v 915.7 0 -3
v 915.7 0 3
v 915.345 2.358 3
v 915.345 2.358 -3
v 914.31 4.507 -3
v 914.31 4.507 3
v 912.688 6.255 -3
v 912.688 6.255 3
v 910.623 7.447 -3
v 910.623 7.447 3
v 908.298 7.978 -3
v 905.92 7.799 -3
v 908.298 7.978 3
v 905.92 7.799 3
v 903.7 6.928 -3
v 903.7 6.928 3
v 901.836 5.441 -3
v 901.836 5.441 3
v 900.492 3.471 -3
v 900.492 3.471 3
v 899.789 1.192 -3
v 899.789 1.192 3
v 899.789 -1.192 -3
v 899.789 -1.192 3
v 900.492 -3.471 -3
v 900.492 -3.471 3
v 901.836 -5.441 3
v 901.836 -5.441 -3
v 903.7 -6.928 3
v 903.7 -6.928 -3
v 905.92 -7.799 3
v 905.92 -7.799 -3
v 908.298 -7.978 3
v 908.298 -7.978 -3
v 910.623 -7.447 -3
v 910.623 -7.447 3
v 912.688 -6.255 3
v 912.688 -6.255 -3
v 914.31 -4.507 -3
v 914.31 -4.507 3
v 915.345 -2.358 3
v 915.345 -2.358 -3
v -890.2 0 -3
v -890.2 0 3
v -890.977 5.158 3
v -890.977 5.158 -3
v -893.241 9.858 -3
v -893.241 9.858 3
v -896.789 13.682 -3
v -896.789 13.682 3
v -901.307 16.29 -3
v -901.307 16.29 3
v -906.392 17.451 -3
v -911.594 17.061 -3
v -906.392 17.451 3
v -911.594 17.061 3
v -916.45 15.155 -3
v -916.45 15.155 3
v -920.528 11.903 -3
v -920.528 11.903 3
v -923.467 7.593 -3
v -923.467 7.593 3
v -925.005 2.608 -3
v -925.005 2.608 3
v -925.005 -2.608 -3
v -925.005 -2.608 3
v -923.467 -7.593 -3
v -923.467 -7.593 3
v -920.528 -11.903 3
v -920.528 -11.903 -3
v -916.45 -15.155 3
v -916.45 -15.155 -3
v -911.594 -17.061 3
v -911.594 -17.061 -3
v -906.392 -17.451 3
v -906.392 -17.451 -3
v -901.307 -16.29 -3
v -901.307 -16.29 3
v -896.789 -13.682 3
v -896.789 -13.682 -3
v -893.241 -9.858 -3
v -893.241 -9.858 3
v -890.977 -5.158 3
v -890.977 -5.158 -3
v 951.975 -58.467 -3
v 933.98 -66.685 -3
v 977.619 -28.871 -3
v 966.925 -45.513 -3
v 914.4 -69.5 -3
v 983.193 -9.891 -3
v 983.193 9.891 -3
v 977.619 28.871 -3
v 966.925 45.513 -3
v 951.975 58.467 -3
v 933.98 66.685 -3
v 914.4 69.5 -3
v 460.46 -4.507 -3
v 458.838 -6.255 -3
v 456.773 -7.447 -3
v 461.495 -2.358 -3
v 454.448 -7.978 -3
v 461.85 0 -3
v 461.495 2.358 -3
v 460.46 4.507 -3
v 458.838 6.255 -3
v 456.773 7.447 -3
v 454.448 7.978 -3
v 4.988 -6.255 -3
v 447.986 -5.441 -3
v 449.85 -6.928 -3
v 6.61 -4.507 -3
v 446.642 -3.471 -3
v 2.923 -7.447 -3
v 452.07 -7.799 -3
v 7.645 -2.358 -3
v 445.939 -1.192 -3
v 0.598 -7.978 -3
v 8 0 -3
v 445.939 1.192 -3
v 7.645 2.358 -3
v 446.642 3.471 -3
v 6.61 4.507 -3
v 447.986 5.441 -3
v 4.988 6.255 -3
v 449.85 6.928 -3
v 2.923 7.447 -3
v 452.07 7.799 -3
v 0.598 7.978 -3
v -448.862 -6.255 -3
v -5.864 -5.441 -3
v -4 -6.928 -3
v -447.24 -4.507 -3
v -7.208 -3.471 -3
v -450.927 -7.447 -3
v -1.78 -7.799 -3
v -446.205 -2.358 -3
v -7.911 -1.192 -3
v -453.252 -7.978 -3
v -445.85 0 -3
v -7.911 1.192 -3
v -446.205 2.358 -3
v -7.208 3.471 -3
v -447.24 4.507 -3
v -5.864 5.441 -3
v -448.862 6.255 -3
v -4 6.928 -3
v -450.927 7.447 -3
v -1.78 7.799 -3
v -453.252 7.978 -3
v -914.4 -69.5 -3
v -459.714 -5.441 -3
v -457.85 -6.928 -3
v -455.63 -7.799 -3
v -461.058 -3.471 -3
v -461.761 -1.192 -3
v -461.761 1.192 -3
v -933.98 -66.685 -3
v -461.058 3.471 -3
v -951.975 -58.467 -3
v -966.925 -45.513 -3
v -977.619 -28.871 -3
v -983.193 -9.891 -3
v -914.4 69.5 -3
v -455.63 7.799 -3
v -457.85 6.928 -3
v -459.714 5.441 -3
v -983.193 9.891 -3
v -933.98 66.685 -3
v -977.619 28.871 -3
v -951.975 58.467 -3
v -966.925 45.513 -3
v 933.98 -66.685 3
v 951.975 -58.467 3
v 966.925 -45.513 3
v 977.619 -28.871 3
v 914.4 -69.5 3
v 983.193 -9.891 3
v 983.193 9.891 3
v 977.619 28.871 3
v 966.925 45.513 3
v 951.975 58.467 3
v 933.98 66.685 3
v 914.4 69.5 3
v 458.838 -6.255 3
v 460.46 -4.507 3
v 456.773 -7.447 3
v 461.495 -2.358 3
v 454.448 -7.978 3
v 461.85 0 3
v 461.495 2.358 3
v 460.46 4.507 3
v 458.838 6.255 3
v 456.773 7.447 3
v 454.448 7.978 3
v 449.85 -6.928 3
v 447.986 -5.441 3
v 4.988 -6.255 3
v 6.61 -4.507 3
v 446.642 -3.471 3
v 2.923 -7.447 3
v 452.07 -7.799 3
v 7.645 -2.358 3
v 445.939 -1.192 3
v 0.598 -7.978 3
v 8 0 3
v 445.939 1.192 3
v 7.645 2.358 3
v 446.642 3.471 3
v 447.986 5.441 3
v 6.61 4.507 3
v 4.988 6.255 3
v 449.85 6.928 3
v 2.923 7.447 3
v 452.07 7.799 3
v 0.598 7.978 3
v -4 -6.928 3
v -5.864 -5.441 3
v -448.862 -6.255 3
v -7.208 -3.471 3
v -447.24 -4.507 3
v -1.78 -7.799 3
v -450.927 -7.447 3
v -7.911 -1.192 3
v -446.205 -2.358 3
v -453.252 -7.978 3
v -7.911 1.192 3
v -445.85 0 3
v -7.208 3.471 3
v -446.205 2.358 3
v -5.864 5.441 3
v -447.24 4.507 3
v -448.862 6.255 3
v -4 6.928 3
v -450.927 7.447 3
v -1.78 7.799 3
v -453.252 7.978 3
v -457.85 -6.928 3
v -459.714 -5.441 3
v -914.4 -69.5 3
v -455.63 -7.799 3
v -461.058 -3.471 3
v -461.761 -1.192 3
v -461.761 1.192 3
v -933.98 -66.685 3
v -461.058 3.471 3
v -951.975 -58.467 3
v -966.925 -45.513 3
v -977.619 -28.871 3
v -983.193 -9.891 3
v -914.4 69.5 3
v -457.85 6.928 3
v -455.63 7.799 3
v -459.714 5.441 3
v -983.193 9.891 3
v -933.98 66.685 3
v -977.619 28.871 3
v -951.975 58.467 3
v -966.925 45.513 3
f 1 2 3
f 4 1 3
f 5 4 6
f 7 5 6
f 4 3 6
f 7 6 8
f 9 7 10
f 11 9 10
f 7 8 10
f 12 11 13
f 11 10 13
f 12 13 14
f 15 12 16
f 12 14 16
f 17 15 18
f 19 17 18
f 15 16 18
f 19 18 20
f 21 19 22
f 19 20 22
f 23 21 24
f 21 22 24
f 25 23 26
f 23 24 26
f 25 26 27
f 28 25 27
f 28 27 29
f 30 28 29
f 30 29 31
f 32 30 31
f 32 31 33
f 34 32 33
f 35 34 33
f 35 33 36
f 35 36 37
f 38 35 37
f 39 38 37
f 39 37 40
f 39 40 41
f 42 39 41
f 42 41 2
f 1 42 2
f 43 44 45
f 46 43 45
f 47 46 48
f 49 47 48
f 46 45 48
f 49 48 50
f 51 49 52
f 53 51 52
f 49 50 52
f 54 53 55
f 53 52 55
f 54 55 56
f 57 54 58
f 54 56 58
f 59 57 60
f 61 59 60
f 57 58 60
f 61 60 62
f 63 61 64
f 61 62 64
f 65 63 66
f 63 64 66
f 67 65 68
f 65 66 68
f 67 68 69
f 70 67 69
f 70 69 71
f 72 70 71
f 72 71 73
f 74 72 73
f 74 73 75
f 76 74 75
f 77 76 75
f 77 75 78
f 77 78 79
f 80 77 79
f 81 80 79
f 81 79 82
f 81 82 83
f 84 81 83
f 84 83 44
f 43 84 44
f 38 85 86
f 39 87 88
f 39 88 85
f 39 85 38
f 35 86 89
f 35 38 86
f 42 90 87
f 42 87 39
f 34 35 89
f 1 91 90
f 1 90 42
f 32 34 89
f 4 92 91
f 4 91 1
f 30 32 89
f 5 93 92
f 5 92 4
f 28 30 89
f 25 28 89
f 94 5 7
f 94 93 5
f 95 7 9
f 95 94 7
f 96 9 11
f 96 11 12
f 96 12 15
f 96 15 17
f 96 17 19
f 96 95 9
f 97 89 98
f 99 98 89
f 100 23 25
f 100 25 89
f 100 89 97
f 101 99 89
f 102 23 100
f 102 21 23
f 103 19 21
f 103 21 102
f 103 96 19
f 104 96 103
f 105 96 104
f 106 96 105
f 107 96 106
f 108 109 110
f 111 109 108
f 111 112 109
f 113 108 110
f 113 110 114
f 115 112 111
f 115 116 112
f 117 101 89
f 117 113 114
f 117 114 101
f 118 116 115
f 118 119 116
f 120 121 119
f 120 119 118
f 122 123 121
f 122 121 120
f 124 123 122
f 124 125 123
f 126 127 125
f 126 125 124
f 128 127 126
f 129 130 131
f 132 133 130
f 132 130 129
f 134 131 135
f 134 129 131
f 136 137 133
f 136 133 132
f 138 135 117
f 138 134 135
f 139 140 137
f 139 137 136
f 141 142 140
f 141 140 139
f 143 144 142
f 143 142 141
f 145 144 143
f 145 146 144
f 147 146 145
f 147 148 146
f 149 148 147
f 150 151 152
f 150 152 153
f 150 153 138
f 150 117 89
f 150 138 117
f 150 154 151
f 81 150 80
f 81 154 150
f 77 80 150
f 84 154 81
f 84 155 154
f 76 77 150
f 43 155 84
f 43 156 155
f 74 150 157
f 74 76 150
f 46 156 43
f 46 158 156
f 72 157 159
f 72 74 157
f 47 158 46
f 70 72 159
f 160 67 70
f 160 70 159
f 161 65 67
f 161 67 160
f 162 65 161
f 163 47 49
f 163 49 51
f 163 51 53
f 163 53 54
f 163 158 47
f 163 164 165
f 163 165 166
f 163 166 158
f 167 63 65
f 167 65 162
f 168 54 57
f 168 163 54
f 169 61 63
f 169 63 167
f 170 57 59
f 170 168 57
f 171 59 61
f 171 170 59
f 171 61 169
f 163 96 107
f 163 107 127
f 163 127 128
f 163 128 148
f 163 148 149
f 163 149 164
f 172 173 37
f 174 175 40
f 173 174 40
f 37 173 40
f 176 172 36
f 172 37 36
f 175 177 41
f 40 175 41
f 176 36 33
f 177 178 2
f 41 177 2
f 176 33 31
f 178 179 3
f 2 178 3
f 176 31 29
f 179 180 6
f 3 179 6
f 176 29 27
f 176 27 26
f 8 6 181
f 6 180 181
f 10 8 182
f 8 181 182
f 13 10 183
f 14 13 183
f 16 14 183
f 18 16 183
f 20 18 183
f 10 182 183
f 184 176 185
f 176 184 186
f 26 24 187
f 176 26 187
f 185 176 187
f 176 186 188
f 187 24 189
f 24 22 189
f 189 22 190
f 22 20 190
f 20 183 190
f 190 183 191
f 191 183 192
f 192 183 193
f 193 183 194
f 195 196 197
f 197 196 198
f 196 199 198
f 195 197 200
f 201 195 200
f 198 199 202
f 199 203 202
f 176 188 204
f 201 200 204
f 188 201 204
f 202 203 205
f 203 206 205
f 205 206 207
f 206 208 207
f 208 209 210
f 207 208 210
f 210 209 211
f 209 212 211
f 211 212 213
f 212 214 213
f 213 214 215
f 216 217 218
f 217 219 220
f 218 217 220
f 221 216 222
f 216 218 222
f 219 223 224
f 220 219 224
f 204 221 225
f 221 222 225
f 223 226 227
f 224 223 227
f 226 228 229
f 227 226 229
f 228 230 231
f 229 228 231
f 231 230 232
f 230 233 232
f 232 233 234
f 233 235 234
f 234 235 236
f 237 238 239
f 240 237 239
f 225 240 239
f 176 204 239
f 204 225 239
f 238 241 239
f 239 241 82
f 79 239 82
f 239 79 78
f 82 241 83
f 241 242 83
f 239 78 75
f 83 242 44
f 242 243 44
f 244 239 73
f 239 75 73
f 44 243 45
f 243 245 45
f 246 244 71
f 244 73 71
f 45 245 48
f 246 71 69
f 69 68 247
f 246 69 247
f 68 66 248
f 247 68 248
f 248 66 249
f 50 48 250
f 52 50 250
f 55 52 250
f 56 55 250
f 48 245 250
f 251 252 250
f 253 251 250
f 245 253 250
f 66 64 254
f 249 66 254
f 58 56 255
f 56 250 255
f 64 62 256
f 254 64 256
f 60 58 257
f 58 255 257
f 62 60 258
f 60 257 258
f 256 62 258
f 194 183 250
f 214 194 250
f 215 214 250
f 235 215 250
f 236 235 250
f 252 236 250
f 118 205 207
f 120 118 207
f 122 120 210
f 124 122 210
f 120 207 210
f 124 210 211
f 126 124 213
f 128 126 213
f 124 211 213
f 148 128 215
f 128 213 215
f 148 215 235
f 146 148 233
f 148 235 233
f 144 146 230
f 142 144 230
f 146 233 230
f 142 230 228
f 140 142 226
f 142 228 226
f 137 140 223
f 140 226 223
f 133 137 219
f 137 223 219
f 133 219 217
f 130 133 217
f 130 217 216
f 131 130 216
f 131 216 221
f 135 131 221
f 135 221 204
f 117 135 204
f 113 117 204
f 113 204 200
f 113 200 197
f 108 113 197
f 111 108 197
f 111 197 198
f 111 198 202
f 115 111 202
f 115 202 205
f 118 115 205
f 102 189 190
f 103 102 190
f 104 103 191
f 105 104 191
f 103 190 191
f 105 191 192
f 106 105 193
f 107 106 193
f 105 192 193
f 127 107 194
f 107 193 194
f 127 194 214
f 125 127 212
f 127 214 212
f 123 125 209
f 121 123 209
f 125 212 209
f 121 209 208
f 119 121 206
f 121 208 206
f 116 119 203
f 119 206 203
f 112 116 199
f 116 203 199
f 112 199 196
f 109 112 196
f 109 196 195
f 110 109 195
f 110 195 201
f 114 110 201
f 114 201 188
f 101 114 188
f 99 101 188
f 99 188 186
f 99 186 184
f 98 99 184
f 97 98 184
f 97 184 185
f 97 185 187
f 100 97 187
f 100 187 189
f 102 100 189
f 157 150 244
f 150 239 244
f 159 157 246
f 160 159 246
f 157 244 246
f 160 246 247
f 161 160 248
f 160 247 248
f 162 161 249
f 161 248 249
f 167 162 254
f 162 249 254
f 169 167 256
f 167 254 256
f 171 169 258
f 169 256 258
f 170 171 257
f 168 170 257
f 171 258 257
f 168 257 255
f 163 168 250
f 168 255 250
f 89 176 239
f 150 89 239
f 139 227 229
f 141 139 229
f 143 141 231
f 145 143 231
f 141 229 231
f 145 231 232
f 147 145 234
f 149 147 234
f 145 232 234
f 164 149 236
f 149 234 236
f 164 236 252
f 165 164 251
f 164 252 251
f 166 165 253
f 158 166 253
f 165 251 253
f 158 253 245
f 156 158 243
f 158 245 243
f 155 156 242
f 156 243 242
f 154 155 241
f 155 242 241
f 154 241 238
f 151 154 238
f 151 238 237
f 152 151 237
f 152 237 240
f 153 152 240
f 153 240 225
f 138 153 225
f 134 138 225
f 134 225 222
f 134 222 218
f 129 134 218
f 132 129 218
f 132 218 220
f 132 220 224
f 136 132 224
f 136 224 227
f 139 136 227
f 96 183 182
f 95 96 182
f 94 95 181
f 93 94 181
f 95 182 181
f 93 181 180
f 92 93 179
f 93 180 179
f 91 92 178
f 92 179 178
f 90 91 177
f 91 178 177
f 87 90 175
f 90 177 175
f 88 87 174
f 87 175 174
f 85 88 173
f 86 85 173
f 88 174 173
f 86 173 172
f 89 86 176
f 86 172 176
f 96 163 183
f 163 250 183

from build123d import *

# Parameters (mm, degrees)
EXTRUDE_THIN1_DEPTH     = 3
BOSS_EXTRUDE1_DEPTH     = 3
SKETCH2_R               = 8
SKETCH2_R_2             = 17.5
CUT_EXTRUDE1_DEPTH      = 1
CUT_EXTRUDE1_DEPTH_BACK = 7


with BuildPart() as part:
    # Sketch1 → Extrude-Thin1 (new body, symmetric)
    with BuildSketch(Plane.XY):
        with BuildLine():
            Line((914.4, -69.5), (-914.4, -69.5))
            ThreePointArc((-914.4, -69.5), (-983.9, 0), (-914.4, 69.5))
            Line((-914.4, 69.5), (914.4, 69.5))
            ThreePointArc((914.4, 69.5), (983.9, 0), (914.4, -69.5))
        make_face()
        with BuildLine():
            Line((914.4, -63.5), (-914.4, -63.5))
            ThreePointArc((-914.4, -63.5), (-977.9, 0), (-914.4, 63.5))
            Line((-914.4, 63.5), (914.4, 63.5))
            ThreePointArc((914.4, 63.5), (977.9, 0), (914.4, -63.5))
        make_face(mode=Mode.SUBTRACT)
    extrude(amount=EXTRUDE_THIN1_DEPTH, both=True)

    # Sketch1<3> → Boss-Extrude1 (add, symmetric)
    with BuildSketch(Plane.XY):
        with BuildLine():
            Line((-914.4, 63.5), (914.4, 63.5))
            ThreePointArc((914.4, 63.5), (977.9, 0), (914.4, -63.5))
            Line((914.4, -63.5), (-914.4, -63.5))
            ThreePointArc((-914.4, -63.5), (-977.9, 0), (-914.4, 63.5))
        make_face()
    extrude(amount=BOSS_EXTRUDE1_DEPTH, both=True)

    # Sketch2 → Cut-Extrude1 (cut, two sides)
    with BuildSketch(Plane.XY.offset(3)) as cut_extrude1_sk:
        Circle(SKETCH2_R)
        with Locations((907.7, 0)):
            Circle(SKETCH2_R)
        with Locations((-907.7, 0)):
            Circle(SKETCH2_R_2)
        with Locations((453.85, 0)):
            Circle(SKETCH2_R)
        with Locations((-453.85, 0)):
            Circle(SKETCH2_R)
    extrude(amount=CUT_EXTRUDE1_DEPTH, mode=Mode.SUBTRACT)
    extrude(cut_extrude1_sk.sketch, amount=-CUT_EXTRUDE1_DEPTH_BACK, mode=Mode.SUBTRACT)


solid = part.part
